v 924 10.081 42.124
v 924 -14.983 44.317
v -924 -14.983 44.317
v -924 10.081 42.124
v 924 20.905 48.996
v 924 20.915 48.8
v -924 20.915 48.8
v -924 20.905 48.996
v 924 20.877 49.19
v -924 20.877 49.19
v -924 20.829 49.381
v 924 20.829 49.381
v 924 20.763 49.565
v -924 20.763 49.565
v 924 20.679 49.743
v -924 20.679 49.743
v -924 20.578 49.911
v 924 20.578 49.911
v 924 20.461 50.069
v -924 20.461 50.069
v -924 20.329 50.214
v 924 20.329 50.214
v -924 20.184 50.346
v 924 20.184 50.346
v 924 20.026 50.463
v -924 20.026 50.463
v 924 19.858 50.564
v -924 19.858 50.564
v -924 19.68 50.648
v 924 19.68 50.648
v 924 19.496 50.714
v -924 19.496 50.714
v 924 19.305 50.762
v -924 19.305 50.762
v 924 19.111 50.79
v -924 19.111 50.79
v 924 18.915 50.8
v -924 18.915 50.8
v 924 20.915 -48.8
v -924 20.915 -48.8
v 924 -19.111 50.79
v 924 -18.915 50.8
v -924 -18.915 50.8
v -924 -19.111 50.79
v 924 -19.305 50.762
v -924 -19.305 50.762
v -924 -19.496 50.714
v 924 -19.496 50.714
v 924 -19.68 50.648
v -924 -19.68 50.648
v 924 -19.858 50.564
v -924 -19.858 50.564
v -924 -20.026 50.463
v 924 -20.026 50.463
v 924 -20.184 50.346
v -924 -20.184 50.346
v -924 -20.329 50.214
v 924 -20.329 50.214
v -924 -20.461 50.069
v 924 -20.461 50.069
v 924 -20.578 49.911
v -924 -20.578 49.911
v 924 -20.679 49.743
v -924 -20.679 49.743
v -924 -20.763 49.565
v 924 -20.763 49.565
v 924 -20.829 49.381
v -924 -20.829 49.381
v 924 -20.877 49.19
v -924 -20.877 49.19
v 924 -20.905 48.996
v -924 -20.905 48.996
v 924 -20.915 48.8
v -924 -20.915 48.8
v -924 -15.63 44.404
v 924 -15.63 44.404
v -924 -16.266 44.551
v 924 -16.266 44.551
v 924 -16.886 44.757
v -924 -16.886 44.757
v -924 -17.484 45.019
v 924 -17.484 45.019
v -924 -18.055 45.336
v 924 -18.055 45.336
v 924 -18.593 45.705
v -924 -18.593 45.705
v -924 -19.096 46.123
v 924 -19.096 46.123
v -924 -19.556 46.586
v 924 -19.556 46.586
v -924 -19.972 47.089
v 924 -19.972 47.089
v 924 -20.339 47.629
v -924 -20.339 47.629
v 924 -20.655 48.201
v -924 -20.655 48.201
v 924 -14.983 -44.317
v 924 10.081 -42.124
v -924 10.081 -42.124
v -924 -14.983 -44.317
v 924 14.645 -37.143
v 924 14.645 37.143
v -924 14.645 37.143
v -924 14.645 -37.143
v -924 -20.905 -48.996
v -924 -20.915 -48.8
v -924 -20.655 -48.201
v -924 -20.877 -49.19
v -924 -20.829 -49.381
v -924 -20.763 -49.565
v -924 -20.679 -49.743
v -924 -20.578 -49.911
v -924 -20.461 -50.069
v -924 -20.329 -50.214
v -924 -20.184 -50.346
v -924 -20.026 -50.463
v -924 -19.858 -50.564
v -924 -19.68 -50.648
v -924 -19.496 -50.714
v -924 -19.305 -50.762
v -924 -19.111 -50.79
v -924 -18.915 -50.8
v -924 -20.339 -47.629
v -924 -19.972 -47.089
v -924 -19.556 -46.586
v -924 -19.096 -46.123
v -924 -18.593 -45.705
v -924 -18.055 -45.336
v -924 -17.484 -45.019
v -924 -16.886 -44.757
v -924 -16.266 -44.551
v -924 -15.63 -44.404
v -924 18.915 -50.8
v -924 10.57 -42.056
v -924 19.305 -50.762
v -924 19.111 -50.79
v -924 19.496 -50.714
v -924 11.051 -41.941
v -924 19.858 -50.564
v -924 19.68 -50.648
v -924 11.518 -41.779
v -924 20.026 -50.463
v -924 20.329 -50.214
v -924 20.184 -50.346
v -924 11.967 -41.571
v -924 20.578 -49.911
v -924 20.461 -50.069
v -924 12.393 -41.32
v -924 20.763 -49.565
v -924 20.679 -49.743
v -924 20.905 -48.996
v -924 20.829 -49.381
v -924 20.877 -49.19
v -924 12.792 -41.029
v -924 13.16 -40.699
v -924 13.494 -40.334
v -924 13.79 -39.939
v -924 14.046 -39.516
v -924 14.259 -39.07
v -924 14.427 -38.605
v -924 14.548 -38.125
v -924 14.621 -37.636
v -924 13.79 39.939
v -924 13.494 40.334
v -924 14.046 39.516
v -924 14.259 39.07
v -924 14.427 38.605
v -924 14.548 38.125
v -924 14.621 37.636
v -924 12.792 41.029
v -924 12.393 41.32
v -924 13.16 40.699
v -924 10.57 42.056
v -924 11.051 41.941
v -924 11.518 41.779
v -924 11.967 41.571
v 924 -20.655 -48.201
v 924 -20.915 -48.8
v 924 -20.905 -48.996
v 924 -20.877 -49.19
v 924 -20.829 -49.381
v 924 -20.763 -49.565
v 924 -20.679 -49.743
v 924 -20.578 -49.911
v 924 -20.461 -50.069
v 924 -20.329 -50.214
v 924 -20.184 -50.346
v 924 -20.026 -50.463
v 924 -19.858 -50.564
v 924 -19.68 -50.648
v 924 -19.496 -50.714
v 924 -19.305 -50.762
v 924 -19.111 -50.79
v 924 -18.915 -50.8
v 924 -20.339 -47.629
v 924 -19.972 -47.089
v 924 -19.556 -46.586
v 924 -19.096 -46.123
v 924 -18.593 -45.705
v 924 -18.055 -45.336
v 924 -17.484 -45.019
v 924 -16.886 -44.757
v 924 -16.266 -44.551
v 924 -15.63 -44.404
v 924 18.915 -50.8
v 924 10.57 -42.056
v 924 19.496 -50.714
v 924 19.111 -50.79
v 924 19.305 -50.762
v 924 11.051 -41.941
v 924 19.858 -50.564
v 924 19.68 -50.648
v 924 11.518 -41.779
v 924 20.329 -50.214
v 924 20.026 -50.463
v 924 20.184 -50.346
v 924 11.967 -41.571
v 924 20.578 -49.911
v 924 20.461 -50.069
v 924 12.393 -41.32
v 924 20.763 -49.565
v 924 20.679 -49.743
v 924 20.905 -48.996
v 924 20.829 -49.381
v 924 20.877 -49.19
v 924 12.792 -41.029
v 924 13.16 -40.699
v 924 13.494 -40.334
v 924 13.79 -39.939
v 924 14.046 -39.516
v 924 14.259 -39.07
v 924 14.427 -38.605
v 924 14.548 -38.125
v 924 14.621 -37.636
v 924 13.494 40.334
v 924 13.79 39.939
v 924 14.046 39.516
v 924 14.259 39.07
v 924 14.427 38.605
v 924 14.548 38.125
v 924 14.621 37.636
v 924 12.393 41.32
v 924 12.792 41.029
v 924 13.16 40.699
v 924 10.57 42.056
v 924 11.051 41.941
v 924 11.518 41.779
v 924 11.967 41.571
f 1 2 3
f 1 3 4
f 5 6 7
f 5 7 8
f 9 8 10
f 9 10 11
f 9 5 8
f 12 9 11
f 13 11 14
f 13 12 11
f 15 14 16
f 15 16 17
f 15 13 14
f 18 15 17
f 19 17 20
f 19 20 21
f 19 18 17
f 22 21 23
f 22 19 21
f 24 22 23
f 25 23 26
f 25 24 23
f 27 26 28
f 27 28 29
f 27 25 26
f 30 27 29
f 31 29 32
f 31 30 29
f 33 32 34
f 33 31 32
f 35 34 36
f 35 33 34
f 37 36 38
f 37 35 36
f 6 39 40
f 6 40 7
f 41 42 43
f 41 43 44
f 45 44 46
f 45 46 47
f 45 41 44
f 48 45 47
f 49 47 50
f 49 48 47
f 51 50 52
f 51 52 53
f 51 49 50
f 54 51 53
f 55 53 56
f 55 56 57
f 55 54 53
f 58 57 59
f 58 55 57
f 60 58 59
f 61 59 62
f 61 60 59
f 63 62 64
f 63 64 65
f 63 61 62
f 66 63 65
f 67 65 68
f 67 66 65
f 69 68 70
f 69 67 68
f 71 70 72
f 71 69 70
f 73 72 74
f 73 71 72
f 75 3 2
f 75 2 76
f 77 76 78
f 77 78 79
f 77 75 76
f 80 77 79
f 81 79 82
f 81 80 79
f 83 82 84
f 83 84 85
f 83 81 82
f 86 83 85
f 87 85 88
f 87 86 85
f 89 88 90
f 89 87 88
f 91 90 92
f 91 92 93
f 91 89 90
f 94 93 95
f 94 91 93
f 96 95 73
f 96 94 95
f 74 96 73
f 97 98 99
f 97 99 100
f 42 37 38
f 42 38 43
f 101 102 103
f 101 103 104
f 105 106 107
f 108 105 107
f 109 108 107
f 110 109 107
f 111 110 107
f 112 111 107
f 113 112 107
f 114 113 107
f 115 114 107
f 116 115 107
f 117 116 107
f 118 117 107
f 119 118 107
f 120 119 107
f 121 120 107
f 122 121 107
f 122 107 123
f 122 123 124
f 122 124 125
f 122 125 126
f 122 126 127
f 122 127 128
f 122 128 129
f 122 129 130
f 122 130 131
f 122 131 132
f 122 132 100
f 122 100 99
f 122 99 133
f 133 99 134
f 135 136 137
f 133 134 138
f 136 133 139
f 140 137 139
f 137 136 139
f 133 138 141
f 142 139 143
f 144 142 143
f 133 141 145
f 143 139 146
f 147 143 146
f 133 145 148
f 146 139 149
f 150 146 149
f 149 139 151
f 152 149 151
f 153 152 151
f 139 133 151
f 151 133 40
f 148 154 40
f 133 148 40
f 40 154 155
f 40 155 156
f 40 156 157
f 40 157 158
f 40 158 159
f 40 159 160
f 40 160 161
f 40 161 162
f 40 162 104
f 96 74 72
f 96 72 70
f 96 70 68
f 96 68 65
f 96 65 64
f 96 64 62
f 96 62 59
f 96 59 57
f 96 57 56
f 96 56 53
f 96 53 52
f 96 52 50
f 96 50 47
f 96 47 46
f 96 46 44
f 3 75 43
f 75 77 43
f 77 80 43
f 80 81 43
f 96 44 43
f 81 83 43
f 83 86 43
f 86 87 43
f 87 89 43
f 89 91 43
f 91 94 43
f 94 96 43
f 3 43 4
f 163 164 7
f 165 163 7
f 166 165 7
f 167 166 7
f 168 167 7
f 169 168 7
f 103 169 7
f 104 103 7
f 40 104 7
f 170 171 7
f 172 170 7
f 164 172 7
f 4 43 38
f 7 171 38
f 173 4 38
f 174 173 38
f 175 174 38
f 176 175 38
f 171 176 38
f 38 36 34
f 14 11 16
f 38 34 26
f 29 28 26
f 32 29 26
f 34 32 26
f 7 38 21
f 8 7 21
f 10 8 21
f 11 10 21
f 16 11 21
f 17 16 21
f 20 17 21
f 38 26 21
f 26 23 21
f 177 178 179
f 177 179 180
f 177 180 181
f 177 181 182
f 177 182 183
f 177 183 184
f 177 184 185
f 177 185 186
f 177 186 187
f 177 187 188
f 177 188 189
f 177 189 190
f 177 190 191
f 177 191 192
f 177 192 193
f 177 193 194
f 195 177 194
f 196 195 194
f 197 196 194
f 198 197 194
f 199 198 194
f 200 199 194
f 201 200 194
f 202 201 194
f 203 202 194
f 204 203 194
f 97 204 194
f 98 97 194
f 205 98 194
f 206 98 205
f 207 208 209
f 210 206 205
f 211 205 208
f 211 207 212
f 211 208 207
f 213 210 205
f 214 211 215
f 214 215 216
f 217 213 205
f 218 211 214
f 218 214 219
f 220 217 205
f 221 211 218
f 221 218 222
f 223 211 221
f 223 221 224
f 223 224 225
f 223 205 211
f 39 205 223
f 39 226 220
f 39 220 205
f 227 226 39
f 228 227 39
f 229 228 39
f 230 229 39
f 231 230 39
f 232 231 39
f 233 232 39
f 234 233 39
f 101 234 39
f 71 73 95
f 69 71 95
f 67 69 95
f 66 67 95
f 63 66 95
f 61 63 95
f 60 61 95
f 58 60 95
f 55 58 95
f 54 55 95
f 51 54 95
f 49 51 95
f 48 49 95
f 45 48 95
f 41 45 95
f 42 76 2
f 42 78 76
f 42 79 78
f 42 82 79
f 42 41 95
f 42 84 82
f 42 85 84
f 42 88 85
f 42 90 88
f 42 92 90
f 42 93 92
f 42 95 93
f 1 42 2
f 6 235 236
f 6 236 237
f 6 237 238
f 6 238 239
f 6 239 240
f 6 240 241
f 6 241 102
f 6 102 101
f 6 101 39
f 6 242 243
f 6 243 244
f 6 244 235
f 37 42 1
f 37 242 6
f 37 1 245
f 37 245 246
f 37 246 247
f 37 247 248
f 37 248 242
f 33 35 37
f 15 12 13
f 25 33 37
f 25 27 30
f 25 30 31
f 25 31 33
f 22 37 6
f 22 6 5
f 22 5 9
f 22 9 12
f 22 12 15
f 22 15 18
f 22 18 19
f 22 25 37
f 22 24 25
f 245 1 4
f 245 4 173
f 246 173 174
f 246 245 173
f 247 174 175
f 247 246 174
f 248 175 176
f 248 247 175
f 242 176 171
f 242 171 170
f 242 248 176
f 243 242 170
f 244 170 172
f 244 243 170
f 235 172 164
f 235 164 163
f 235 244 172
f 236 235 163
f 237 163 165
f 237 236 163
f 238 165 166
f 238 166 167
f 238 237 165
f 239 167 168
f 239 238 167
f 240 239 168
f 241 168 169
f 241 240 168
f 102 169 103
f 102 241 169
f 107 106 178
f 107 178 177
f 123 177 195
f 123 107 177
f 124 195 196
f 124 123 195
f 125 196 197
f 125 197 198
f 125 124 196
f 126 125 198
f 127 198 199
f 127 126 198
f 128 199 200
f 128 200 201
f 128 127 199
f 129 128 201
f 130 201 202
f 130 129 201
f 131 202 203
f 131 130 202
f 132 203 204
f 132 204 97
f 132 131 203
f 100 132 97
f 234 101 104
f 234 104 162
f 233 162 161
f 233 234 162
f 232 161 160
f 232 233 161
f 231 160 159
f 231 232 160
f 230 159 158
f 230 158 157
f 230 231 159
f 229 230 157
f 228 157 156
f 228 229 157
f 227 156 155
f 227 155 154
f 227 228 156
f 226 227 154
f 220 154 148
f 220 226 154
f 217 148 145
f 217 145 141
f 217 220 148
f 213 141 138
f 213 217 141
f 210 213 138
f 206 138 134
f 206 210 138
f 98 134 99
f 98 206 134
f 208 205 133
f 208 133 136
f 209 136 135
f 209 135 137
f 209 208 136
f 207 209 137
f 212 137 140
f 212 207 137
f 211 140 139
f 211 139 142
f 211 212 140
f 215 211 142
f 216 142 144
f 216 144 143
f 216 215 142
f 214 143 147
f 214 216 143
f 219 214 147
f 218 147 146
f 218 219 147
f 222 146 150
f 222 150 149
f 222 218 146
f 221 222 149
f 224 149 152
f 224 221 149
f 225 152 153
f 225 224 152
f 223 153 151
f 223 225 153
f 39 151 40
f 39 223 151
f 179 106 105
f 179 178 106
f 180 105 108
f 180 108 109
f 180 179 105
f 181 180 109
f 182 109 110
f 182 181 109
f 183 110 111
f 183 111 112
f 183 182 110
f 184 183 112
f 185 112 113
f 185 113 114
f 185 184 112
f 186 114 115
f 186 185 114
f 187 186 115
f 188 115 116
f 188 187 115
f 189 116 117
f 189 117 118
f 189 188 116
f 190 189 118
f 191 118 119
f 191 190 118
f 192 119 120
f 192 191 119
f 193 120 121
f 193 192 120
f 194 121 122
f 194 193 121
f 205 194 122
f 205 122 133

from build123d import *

# Parameters (mm, degrees)
F1_DEPTH    = 924
F2_T1_DEPTH = 1877.7738168108


# Not quite as in the source:
# - a fillet or chamfer that OpenCascade refuses, or shapes differently, is made with other operations: its cross-section is extruded or revolved along the edge and cut away or added


with BuildPart() as f1:
    # F0 (on Right) → F1 (new body, symmetric)
    with BuildSketch(Plane.YZ):
        with BuildLine():
            ThreePointArc((-20.915, -48.8), (-20.3292135624, -50.2142135624), (-18.915, -50.8))
            Line((-18.915, -50.8), (18.915, -50.8))
            ThreePointArc((18.915, -50.8), (20.3292135624, -50.2142135624), (20.915, -48.8))
            Line((20.915, -48.8), (20.915, 48.8))
            ThreePointArc((20.915, 48.8), (20.3292135624, 50.2142135624), (18.915, 50.8))
            Line((18.915, 50.8), (-18.915, 50.8))
            ThreePointArc((-18.915, 50.8), (-20.3292135624, 50.2142135624), (-20.915, 48.8))
            Line((-20.915, 48.8), (-20.915, 44.8355484375))
            Line((-20.915, 44.8355484375), (10.0807787137, 42.1237691829))
            ThreePointArc((10.0807787137, 42.1237691829), (13.3313866841, 40.5207467305), (14.645, 37.1427956924))
            Line((14.645, 37.1427956924), (14.645, -37.1427956924))
            ThreePointArc((14.645, -37.1427956924), (13.3313866841, -40.5207467305), (10.0807787137, -42.1237691829))
            Line((10.0807787137, -42.1237691829), (-20.915, -44.8355484375))
            Line((-20.915, -44.8355484375), (-20.915, -48.8))
        make_face()
    extrude(amount=F1_DEPTH, both=True)

    # F2: fillet of radius 7 on 2 edges, made by hand

    # F2_s2 → F2_t1 (cut)
    with BuildSketch(Plane.YZ.offset(-938.8869084054)):
        with BuildLine():
            ThreePointArc((-20.915, -48.8), (-18.5934823683, -45.7054865005), (-14.9828963102, -44.3165566138))
            Line((-14.9828963102, -44.3165566138), (-14.9950981142, -44.177089356))
            Line((-14.9950981142, -44.177089356), (-20.927201804, -44.6960811798))
            Line((-20.927201804, -44.6960811798), (-21.055, -44.8355484375))
            ThreePointArc((-21.055, -44.8355484375), (-21.055, -46.8177742187), (-21.0458438778, -48.75020161))
            Line((-21.0458438778, -48.75020161), (-20.915, -48.8))
        make_face()
        with BuildLine():
            ThreePointArc((-14.9828963102, 44.3165566138), (-18.5934823683, 45.7054865005), (-20.915, 48.8))
            Line((-20.915, 48.8), (-21.0458438778, 48.75020161))
            ThreePointArc((-21.0458438778, 48.75020161), (-21.055, 46.8177742187), (-21.055, 44.8355484375))
            Line((-21.055, 44.8355484375), (-20.927201804, 44.6960811798))
            Line((-20.927201804, 44.6960811798), (-14.9950981142, 44.177089356))
            Line((-14.9950981142, 44.177089356), (-14.9828963102, 44.3165566138))
        make_face()
    extrude(amount=F2_T1_DEPTH, mode=Mode.SUBTRACT)


solid = f1.part
